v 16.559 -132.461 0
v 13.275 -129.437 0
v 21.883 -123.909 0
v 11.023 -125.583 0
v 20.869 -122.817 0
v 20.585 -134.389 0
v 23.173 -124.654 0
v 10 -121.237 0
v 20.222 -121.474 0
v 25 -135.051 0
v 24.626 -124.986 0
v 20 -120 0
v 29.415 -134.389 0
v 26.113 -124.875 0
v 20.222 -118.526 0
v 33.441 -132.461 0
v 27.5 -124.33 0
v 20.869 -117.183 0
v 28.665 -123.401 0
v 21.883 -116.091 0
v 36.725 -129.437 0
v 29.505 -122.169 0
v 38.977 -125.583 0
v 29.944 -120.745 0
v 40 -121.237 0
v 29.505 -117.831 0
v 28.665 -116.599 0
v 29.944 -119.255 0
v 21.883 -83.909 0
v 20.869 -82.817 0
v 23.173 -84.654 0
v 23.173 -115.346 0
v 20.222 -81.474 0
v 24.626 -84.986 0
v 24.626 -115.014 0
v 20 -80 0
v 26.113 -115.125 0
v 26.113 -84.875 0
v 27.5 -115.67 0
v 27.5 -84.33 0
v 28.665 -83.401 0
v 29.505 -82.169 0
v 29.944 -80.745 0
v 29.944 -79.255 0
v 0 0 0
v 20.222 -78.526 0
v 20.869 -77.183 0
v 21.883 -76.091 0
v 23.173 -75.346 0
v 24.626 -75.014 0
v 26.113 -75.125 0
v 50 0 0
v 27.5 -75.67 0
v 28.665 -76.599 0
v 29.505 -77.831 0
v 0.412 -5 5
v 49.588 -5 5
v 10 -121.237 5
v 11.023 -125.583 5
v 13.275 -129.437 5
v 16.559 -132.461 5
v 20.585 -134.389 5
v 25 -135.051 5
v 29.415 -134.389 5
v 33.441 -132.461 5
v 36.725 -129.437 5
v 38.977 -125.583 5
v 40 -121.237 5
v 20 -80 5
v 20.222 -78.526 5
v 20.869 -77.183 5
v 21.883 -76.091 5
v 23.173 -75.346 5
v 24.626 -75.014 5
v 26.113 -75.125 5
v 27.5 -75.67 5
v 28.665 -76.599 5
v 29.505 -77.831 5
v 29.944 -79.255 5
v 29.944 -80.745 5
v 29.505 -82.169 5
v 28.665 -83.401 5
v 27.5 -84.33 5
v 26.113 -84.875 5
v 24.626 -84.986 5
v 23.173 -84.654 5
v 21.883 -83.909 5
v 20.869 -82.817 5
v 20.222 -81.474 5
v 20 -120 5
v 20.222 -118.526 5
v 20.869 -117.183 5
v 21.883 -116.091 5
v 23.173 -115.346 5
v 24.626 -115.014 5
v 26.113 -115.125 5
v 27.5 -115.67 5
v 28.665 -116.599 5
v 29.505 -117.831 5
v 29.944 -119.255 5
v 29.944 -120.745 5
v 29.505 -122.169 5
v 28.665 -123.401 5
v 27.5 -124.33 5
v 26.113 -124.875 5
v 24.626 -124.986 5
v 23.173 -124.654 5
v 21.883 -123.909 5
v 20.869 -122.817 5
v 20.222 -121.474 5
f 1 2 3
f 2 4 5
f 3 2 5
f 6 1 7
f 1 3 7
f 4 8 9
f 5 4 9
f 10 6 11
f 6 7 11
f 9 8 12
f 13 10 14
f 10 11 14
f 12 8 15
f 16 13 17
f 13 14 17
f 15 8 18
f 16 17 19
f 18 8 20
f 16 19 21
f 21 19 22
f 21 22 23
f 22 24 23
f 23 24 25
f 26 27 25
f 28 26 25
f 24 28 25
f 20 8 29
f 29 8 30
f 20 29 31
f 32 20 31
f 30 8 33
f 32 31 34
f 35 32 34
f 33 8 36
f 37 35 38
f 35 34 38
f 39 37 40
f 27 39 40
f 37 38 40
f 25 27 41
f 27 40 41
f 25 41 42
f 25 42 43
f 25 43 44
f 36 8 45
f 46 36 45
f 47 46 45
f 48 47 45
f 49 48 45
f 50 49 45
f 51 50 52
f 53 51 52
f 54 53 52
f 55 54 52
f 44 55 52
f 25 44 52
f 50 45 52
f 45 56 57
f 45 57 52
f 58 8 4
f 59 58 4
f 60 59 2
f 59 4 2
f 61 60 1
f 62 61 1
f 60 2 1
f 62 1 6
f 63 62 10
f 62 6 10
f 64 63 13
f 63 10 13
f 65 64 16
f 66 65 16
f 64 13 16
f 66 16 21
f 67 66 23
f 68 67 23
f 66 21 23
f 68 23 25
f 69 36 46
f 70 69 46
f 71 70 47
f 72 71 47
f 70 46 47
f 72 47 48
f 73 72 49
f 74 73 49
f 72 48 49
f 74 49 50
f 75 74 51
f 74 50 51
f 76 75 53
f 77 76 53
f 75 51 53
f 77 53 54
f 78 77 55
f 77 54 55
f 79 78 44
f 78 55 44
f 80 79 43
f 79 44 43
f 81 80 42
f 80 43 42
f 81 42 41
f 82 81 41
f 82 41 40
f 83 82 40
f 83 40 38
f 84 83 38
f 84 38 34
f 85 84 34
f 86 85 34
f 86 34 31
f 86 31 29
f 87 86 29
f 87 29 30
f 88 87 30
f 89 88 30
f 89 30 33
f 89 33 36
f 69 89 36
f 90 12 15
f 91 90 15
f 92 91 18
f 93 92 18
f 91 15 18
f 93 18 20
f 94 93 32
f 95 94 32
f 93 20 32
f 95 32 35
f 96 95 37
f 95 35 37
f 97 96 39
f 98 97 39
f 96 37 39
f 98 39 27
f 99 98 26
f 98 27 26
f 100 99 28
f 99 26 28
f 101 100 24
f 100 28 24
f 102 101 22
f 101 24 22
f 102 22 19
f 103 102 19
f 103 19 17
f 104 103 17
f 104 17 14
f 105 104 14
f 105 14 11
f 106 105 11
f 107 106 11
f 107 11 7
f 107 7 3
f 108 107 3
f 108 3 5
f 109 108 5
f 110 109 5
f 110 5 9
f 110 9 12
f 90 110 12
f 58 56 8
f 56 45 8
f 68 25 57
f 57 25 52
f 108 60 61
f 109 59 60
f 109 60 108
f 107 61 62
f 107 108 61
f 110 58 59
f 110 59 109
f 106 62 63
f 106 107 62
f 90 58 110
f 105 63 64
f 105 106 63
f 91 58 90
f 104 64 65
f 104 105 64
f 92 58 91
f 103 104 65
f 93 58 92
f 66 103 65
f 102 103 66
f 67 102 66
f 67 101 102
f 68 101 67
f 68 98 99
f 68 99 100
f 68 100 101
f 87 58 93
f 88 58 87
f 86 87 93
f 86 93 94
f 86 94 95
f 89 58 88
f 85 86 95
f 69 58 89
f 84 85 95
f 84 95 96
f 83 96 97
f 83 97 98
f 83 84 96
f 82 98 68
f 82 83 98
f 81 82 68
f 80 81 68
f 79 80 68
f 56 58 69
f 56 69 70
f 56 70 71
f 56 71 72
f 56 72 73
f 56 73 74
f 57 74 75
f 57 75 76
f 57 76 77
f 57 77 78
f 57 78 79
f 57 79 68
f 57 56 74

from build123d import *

# Parameters (mm, degrees)
F1_DEPTH = 5
F3_DEPTH = 50.001
F5_D     = 10
F5_DEPTH = 100


with BuildPart() as f1:
    # F0 (on Top) → F1 (new body)
    with BuildSketch(Plane.XY):
        with BuildLine():
            Line((50, 0), (0, 0))
            Line((0, 0), (10, -121.237244))
            ThreePointArc((10, -121.237244), (25, -135.050939), (40, -121.237244))
            Line((40, -121.237244), (50, 0))
        make_face()
    extrude(amount=F1_DEPTH)

    # F2 (on Right) → F3 (cut, through all)
    with BuildSketch(Plane.YZ):
        Polygon((-5, 5), (0, 0), (0, 5), align=None)
    extrude(amount=F3_DEPTH, mode=Mode.SUBTRACT)

    # F5
    with Locations(Plane.XY.offset(5)):
        with Locations((25, -120), (25, -80)):
            Hole(F5_D / 2, depth=F5_DEPTH)


solid = f1.part
